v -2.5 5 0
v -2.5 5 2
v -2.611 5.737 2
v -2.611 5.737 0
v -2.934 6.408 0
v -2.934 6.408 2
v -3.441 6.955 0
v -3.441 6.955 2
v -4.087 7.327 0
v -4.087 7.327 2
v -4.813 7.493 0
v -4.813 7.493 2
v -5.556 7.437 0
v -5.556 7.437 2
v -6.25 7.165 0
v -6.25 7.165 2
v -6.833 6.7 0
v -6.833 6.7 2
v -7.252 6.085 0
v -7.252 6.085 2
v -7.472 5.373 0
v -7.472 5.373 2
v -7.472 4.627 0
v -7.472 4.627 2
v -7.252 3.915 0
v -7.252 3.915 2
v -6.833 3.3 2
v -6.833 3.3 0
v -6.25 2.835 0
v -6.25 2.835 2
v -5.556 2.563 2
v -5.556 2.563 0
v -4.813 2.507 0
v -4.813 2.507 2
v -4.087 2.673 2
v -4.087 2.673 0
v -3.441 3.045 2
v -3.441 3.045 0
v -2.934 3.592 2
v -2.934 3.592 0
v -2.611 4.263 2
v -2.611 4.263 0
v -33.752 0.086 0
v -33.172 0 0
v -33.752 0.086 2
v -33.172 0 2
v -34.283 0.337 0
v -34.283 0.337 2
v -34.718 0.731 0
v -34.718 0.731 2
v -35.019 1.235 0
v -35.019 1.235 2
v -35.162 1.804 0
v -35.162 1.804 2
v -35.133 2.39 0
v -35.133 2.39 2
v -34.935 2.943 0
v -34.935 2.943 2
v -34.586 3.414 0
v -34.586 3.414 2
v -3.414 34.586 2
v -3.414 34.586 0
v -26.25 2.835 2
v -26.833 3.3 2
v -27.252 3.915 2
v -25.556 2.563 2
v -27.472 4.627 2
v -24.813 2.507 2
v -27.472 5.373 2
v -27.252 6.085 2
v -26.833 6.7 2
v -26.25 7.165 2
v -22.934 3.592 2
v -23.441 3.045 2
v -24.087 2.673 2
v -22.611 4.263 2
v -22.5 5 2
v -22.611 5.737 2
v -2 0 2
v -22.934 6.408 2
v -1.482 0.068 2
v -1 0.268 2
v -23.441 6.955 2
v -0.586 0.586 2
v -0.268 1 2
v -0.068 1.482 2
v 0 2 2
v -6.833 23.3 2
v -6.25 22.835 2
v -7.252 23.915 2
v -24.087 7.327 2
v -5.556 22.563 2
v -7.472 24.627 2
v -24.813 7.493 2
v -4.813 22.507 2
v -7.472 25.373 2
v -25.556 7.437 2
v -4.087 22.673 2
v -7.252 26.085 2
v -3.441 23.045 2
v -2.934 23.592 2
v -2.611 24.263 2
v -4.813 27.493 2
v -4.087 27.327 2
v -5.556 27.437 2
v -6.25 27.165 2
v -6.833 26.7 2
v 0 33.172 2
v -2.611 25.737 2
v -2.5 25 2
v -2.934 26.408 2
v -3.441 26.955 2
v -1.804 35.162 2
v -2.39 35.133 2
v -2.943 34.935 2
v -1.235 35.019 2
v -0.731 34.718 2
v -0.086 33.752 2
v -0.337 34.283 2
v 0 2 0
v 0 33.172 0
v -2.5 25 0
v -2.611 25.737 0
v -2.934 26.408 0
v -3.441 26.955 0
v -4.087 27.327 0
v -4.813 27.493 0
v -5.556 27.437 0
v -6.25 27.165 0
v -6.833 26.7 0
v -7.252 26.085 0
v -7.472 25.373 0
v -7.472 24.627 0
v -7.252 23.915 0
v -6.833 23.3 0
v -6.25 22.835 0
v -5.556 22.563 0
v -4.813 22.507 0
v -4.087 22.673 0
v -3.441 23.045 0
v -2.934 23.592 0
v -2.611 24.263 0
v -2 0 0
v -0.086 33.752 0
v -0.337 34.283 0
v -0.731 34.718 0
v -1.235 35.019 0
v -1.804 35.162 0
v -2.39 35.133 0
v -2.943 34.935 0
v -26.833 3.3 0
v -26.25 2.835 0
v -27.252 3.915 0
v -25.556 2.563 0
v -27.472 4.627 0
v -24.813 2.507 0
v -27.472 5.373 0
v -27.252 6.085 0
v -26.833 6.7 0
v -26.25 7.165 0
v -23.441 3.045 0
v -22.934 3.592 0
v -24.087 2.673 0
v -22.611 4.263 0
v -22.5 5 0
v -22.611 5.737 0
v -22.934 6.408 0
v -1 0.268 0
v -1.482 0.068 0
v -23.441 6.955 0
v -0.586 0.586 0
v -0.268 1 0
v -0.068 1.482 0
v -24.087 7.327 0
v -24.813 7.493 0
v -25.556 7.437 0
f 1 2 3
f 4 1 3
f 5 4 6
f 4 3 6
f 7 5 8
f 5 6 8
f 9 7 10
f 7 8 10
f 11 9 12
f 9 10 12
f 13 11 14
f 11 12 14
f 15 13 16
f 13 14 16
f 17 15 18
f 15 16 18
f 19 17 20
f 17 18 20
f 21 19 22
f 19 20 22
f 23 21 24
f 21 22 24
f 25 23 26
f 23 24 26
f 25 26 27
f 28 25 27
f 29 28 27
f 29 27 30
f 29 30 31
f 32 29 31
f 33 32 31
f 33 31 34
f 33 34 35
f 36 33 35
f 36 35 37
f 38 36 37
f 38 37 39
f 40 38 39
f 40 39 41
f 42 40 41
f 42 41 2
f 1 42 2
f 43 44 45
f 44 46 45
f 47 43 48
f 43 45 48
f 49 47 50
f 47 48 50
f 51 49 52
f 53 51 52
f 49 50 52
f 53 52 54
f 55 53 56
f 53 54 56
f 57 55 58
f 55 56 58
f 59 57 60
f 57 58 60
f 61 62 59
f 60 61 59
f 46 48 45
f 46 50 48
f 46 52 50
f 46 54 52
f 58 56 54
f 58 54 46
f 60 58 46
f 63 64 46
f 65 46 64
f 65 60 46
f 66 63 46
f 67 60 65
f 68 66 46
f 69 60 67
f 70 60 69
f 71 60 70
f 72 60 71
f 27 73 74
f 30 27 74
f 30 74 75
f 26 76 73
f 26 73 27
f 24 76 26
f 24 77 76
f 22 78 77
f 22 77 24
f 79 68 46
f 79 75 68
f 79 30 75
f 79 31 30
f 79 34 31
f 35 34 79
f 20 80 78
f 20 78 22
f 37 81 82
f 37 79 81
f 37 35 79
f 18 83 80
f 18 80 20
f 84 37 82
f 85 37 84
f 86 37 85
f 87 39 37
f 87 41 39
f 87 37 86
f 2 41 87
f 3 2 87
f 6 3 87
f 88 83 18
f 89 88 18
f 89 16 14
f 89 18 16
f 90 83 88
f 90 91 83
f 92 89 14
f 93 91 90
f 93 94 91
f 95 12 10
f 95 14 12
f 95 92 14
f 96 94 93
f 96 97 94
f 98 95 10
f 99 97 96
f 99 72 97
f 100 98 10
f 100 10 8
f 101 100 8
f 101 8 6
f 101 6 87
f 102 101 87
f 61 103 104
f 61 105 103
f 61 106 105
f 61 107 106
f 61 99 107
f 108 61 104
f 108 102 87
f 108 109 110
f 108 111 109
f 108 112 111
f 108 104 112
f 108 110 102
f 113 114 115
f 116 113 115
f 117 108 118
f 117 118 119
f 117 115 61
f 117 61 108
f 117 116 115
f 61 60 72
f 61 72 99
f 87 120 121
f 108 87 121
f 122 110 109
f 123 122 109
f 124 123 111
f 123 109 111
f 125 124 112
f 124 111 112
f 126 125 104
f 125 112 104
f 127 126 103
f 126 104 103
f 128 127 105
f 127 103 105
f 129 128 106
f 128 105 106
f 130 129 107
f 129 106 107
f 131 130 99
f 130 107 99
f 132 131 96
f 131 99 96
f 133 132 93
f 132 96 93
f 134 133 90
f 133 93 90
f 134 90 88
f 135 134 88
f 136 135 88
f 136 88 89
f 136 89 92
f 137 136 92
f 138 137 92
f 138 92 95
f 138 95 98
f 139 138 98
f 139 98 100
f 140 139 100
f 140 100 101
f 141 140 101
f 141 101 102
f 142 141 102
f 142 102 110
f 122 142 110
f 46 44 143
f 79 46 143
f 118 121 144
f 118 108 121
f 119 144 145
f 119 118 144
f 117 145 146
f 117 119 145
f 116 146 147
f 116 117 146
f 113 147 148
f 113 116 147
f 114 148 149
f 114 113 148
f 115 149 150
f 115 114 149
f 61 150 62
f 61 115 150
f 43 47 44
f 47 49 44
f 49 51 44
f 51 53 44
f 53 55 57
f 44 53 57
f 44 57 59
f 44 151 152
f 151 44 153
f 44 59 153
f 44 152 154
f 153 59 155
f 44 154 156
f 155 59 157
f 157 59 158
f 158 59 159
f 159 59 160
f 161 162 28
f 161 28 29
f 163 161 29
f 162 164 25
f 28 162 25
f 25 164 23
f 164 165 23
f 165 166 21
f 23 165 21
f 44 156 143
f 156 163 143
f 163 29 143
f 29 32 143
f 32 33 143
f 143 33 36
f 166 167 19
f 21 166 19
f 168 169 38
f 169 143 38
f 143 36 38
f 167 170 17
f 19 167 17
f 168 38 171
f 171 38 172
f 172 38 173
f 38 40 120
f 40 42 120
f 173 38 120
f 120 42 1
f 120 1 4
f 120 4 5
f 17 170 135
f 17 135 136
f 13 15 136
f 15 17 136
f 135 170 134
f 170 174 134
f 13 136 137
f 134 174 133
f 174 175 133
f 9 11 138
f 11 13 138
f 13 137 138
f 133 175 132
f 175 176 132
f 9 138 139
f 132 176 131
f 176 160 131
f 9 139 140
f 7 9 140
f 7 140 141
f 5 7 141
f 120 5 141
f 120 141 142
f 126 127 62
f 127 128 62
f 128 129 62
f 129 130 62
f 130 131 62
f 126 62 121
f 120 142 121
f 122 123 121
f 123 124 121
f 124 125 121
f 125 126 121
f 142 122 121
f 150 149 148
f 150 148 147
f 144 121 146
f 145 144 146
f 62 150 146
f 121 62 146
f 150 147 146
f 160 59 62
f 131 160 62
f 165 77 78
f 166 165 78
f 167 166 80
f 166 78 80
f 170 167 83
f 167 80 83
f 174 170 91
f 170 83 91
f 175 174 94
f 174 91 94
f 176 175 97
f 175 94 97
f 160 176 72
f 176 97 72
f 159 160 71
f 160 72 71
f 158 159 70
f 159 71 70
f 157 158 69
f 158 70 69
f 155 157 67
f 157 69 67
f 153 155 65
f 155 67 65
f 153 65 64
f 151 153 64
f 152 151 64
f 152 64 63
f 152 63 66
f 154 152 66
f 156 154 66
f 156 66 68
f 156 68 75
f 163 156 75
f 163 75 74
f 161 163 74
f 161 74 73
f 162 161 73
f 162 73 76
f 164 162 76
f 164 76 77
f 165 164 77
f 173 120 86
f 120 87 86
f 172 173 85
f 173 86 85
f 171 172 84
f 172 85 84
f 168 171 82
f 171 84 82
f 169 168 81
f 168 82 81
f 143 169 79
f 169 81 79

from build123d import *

# Parameters (mm, degrees)
BOSS_EXTRUDE1_DEPTH   = 2
F_5_0MM_DOWEL_HOLE1_D = 5
FILLET1_R             = 2


with BuildPart() as part:
    # Sketch1 → Boss-Extrude1 (new body)
    with BuildSketch(Plane.XY):
        Polygon((0, 0), (0, 38), (-38, 0), align=None)
    extrude(amount=BOSS_EXTRUDE1_DEPTH)

    # Ø5.0mm Dowel Hole1 (through all)
    with Locations(Plane(origin=(0, 0, 0), x_dir=(-1, 0, 0), z_dir=(0, 0, -1))):
        with Locations((5, 25), (5, 5), (25, 5)):
            Hole(F_5_0MM_DOWEL_HOLE1_D / 2)

    # Fillet1
    fillet1_edges = [part.edges().sort_by_distance(p)[0] for p in [
        (-38, 0, 1),
        (0, 38, 1),
        (0, 0, 1),
    ]]
    fillet(fillet1_edges, radius=FILLET1_R)


solid = part.part
